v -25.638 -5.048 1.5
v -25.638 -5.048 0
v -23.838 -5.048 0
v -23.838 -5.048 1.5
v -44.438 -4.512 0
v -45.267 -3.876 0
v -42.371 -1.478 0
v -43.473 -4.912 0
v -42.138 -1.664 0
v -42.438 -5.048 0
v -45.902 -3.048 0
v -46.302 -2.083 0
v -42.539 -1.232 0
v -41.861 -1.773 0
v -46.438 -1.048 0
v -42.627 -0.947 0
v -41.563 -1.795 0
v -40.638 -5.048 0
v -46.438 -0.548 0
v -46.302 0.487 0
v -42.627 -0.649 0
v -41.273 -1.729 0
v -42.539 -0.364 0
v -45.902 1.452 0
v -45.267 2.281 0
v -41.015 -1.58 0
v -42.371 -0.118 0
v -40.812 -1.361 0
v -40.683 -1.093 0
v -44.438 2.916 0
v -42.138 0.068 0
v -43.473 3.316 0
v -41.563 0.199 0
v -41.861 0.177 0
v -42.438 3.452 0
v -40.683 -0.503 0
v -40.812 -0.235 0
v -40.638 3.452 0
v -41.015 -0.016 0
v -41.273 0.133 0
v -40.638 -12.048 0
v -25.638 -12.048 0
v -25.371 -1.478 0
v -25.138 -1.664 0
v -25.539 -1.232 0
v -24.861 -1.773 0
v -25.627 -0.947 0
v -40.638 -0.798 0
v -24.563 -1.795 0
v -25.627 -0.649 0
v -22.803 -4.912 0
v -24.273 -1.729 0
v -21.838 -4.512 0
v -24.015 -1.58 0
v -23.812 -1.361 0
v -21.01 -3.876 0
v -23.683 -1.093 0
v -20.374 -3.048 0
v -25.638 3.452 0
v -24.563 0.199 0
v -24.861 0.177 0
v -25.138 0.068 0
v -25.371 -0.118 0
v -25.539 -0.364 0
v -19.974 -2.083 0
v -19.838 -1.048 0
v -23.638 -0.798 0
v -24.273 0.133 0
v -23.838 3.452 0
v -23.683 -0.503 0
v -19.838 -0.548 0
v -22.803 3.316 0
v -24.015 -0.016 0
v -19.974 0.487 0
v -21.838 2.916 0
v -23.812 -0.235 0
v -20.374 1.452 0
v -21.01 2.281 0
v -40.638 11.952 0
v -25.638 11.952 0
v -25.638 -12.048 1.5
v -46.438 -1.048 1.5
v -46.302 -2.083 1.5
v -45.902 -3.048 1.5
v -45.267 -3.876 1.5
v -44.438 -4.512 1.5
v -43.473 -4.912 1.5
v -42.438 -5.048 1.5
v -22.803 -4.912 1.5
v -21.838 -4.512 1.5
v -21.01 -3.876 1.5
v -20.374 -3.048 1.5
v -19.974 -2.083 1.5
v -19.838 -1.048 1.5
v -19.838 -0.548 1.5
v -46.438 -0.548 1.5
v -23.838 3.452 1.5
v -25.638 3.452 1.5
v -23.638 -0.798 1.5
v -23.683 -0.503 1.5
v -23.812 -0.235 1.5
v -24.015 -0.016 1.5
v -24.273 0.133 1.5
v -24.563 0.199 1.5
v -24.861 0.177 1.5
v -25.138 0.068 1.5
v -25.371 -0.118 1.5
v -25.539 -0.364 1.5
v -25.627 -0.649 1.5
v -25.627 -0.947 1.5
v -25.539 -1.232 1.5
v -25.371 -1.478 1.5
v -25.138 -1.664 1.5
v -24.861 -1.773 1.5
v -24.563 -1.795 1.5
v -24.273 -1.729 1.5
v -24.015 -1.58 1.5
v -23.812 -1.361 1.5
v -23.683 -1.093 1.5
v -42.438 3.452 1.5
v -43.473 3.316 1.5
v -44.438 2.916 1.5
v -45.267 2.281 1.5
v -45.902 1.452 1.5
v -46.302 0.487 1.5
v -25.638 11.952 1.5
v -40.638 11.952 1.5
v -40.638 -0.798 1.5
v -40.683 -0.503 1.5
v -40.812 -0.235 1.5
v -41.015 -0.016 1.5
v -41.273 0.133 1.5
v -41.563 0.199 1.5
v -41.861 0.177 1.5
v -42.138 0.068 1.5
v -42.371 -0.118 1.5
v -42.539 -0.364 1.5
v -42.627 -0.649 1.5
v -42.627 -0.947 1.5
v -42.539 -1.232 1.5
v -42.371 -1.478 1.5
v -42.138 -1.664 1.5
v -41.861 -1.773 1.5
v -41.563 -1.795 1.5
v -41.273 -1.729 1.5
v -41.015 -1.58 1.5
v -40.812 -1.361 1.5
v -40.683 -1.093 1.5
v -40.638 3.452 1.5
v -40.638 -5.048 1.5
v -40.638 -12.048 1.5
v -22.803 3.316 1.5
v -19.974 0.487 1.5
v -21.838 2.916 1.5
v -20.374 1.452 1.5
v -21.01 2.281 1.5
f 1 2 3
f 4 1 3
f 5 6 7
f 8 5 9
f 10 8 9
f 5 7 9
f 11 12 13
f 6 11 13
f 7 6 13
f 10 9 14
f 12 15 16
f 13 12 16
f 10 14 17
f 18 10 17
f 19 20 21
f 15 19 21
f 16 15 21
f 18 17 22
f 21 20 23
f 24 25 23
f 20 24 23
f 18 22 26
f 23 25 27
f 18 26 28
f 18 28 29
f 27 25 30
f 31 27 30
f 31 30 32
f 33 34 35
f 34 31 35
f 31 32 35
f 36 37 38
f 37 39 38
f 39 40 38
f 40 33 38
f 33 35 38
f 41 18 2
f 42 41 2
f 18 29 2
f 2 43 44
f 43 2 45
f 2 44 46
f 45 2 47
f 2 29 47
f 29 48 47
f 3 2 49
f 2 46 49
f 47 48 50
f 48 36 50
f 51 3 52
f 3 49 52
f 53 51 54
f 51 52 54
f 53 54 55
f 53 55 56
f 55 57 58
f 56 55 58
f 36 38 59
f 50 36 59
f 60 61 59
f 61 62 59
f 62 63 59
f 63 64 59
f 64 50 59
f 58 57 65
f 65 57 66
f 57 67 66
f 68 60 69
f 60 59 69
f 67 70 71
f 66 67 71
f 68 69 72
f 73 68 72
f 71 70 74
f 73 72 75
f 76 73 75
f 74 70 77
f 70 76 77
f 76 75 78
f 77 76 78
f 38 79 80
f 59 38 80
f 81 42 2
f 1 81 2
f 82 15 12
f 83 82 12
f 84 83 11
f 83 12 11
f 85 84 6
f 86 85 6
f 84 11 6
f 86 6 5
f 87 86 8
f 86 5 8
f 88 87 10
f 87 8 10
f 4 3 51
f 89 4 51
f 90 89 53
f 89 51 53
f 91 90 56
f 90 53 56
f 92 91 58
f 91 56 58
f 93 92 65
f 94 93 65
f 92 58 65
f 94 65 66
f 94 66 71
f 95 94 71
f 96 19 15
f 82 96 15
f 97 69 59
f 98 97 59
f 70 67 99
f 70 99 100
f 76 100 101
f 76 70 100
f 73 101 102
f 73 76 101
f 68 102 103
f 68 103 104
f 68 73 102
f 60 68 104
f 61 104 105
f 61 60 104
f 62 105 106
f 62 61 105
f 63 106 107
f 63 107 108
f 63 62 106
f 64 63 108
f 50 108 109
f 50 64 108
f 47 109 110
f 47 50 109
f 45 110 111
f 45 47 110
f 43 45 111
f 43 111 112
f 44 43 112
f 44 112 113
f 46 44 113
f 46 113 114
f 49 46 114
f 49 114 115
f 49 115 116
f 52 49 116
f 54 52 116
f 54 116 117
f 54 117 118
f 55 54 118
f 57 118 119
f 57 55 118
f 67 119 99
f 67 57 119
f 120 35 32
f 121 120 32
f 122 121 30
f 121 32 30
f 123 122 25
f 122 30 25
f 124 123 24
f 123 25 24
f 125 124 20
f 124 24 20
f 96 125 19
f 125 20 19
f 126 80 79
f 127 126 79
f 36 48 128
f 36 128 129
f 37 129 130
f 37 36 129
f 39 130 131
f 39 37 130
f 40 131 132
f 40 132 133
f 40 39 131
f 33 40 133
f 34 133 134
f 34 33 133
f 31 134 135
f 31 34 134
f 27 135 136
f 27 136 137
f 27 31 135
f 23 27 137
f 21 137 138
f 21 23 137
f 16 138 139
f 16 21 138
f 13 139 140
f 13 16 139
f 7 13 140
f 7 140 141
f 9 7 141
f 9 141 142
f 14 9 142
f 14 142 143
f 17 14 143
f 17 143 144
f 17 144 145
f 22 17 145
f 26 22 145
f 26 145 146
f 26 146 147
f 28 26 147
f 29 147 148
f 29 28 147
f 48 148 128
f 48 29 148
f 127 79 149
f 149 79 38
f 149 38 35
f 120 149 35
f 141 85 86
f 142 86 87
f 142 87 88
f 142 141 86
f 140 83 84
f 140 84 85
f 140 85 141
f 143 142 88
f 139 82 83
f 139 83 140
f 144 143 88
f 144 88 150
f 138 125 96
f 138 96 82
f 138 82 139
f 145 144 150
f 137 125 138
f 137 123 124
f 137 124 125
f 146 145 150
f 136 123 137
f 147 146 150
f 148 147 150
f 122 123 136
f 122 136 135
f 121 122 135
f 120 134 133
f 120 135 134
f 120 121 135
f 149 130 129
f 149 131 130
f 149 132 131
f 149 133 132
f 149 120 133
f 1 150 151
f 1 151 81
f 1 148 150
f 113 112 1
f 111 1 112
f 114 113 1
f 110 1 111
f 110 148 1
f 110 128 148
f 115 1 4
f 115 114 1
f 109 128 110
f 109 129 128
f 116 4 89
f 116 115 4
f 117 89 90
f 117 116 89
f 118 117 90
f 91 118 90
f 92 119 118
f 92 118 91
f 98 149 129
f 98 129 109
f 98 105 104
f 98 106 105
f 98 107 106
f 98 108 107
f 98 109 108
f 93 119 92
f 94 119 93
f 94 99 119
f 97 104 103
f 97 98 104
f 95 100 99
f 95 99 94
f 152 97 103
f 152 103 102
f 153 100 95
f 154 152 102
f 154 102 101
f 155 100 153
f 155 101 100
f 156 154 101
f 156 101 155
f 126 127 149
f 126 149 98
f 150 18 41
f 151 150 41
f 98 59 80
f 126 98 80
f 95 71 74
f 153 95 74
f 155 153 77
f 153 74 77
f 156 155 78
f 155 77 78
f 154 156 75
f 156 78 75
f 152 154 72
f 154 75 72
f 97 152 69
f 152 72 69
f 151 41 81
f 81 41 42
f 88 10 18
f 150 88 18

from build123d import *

# Parameters (mm, degrees)
ESBO_O2_W                = 28.244172386
ESBO_O2_H                = 13.944205314
RESSALTO_EXTRUS_O1_DEPTH = 2.54
ESBO_O3_R                = 1
RESSALTO_EXTRUS_O2_DEPTH = 1.5
ESBO_O4_W                = 28.244172386
ESBO_O4_H                = 13.944205314
CORTE_EXTRUS_O1_DEPTH    = 2.54


with BuildPart() as part:
    # Esboço2 → Ressalto-extrusão1 (new body)
    with BuildSketch(Plane.XY):
        Rectangle(ESBO_O2_W, ESBO_O2_H)
    extrude(amount=RESSALTO_EXTRUS_O1_DEPTH)

    # Esboço4 → Corte-extrusão1 (cut)
    with BuildSketch(Plane.XY.offset(2.54)):
        Rectangle(ESBO_O4_W, ESBO_O4_H)
    extrude(amount=-CORTE_EXTRUS_O1_DEPTH, mode=Mode.SUBTRACT)


with BuildPart() as body_2:
    # Esboço3 → Ressalto-extrusão2 (new body)
    with BuildSketch(Plane.XY):
        with BuildLine():
            Line((-40.638175932, 11.952156585), (-40.638175932, 3.452156585))
            Line((-40.638175932, 3.452156585), (-42.438175932, 3.452156585))
            ThreePointArc((-42.438175932, 3.452156585), (-45.266603057, 2.28058371), (-46.438175932, -0.547843415))
            Line((-46.438175932, -0.547843415), (-46.438175932, -1.047843415))
            ThreePointArc((-46.438175932, -1.047843415), (-45.266603057, -3.876270539), (-42.438175932, -5.047843415))
            Line((-42.438175932, -5.047843415), (-40.638175932, -5.047843415))
            Line((-40.638175932, -5.047843415), (-40.638175932, -12.047843415))
            Line((-40.638175932, -12.047843415), (-25.638175932, -12.047843415))
            Line((-25.638175932, -12.047843415), (-25.638175932, -5.047843415))
            Line((-25.638175932, -5.047843415), (-23.838175932, -5.047843415))
            ThreePointArc((-23.838175932, -5.047843415), (-21.009748807, -3.876270539), (-19.838175932, -1.047843415))
            Line((-19.838175932, -1.047843415), (-19.838175932, -0.547843415))
            ThreePointArc((-19.838175932, -0.547843415), (-21.009748807, 2.28058371), (-23.838175932, 3.452156585))
            Line((-23.838175932, 3.452156585), (-25.638175932, 3.452156585))
            Line((-25.638175932, 3.452156585), (-25.638175932, 11.952156585))
            Line((-25.638175932, 11.952156585), (-40.638175932, 11.952156585))
        make_face()
        with Locations((-41.638175932, -0.797843415)):
            Circle(ESBO_O3_R, mode=Mode.SUBTRACT)
        with Locations((-24.638175932, -0.797843415)):
            Circle(ESBO_O3_R, mode=Mode.SUBTRACT)
    extrude(amount=RESSALTO_EXTRUS_O2_DEPTH)


solid = body_2.part
